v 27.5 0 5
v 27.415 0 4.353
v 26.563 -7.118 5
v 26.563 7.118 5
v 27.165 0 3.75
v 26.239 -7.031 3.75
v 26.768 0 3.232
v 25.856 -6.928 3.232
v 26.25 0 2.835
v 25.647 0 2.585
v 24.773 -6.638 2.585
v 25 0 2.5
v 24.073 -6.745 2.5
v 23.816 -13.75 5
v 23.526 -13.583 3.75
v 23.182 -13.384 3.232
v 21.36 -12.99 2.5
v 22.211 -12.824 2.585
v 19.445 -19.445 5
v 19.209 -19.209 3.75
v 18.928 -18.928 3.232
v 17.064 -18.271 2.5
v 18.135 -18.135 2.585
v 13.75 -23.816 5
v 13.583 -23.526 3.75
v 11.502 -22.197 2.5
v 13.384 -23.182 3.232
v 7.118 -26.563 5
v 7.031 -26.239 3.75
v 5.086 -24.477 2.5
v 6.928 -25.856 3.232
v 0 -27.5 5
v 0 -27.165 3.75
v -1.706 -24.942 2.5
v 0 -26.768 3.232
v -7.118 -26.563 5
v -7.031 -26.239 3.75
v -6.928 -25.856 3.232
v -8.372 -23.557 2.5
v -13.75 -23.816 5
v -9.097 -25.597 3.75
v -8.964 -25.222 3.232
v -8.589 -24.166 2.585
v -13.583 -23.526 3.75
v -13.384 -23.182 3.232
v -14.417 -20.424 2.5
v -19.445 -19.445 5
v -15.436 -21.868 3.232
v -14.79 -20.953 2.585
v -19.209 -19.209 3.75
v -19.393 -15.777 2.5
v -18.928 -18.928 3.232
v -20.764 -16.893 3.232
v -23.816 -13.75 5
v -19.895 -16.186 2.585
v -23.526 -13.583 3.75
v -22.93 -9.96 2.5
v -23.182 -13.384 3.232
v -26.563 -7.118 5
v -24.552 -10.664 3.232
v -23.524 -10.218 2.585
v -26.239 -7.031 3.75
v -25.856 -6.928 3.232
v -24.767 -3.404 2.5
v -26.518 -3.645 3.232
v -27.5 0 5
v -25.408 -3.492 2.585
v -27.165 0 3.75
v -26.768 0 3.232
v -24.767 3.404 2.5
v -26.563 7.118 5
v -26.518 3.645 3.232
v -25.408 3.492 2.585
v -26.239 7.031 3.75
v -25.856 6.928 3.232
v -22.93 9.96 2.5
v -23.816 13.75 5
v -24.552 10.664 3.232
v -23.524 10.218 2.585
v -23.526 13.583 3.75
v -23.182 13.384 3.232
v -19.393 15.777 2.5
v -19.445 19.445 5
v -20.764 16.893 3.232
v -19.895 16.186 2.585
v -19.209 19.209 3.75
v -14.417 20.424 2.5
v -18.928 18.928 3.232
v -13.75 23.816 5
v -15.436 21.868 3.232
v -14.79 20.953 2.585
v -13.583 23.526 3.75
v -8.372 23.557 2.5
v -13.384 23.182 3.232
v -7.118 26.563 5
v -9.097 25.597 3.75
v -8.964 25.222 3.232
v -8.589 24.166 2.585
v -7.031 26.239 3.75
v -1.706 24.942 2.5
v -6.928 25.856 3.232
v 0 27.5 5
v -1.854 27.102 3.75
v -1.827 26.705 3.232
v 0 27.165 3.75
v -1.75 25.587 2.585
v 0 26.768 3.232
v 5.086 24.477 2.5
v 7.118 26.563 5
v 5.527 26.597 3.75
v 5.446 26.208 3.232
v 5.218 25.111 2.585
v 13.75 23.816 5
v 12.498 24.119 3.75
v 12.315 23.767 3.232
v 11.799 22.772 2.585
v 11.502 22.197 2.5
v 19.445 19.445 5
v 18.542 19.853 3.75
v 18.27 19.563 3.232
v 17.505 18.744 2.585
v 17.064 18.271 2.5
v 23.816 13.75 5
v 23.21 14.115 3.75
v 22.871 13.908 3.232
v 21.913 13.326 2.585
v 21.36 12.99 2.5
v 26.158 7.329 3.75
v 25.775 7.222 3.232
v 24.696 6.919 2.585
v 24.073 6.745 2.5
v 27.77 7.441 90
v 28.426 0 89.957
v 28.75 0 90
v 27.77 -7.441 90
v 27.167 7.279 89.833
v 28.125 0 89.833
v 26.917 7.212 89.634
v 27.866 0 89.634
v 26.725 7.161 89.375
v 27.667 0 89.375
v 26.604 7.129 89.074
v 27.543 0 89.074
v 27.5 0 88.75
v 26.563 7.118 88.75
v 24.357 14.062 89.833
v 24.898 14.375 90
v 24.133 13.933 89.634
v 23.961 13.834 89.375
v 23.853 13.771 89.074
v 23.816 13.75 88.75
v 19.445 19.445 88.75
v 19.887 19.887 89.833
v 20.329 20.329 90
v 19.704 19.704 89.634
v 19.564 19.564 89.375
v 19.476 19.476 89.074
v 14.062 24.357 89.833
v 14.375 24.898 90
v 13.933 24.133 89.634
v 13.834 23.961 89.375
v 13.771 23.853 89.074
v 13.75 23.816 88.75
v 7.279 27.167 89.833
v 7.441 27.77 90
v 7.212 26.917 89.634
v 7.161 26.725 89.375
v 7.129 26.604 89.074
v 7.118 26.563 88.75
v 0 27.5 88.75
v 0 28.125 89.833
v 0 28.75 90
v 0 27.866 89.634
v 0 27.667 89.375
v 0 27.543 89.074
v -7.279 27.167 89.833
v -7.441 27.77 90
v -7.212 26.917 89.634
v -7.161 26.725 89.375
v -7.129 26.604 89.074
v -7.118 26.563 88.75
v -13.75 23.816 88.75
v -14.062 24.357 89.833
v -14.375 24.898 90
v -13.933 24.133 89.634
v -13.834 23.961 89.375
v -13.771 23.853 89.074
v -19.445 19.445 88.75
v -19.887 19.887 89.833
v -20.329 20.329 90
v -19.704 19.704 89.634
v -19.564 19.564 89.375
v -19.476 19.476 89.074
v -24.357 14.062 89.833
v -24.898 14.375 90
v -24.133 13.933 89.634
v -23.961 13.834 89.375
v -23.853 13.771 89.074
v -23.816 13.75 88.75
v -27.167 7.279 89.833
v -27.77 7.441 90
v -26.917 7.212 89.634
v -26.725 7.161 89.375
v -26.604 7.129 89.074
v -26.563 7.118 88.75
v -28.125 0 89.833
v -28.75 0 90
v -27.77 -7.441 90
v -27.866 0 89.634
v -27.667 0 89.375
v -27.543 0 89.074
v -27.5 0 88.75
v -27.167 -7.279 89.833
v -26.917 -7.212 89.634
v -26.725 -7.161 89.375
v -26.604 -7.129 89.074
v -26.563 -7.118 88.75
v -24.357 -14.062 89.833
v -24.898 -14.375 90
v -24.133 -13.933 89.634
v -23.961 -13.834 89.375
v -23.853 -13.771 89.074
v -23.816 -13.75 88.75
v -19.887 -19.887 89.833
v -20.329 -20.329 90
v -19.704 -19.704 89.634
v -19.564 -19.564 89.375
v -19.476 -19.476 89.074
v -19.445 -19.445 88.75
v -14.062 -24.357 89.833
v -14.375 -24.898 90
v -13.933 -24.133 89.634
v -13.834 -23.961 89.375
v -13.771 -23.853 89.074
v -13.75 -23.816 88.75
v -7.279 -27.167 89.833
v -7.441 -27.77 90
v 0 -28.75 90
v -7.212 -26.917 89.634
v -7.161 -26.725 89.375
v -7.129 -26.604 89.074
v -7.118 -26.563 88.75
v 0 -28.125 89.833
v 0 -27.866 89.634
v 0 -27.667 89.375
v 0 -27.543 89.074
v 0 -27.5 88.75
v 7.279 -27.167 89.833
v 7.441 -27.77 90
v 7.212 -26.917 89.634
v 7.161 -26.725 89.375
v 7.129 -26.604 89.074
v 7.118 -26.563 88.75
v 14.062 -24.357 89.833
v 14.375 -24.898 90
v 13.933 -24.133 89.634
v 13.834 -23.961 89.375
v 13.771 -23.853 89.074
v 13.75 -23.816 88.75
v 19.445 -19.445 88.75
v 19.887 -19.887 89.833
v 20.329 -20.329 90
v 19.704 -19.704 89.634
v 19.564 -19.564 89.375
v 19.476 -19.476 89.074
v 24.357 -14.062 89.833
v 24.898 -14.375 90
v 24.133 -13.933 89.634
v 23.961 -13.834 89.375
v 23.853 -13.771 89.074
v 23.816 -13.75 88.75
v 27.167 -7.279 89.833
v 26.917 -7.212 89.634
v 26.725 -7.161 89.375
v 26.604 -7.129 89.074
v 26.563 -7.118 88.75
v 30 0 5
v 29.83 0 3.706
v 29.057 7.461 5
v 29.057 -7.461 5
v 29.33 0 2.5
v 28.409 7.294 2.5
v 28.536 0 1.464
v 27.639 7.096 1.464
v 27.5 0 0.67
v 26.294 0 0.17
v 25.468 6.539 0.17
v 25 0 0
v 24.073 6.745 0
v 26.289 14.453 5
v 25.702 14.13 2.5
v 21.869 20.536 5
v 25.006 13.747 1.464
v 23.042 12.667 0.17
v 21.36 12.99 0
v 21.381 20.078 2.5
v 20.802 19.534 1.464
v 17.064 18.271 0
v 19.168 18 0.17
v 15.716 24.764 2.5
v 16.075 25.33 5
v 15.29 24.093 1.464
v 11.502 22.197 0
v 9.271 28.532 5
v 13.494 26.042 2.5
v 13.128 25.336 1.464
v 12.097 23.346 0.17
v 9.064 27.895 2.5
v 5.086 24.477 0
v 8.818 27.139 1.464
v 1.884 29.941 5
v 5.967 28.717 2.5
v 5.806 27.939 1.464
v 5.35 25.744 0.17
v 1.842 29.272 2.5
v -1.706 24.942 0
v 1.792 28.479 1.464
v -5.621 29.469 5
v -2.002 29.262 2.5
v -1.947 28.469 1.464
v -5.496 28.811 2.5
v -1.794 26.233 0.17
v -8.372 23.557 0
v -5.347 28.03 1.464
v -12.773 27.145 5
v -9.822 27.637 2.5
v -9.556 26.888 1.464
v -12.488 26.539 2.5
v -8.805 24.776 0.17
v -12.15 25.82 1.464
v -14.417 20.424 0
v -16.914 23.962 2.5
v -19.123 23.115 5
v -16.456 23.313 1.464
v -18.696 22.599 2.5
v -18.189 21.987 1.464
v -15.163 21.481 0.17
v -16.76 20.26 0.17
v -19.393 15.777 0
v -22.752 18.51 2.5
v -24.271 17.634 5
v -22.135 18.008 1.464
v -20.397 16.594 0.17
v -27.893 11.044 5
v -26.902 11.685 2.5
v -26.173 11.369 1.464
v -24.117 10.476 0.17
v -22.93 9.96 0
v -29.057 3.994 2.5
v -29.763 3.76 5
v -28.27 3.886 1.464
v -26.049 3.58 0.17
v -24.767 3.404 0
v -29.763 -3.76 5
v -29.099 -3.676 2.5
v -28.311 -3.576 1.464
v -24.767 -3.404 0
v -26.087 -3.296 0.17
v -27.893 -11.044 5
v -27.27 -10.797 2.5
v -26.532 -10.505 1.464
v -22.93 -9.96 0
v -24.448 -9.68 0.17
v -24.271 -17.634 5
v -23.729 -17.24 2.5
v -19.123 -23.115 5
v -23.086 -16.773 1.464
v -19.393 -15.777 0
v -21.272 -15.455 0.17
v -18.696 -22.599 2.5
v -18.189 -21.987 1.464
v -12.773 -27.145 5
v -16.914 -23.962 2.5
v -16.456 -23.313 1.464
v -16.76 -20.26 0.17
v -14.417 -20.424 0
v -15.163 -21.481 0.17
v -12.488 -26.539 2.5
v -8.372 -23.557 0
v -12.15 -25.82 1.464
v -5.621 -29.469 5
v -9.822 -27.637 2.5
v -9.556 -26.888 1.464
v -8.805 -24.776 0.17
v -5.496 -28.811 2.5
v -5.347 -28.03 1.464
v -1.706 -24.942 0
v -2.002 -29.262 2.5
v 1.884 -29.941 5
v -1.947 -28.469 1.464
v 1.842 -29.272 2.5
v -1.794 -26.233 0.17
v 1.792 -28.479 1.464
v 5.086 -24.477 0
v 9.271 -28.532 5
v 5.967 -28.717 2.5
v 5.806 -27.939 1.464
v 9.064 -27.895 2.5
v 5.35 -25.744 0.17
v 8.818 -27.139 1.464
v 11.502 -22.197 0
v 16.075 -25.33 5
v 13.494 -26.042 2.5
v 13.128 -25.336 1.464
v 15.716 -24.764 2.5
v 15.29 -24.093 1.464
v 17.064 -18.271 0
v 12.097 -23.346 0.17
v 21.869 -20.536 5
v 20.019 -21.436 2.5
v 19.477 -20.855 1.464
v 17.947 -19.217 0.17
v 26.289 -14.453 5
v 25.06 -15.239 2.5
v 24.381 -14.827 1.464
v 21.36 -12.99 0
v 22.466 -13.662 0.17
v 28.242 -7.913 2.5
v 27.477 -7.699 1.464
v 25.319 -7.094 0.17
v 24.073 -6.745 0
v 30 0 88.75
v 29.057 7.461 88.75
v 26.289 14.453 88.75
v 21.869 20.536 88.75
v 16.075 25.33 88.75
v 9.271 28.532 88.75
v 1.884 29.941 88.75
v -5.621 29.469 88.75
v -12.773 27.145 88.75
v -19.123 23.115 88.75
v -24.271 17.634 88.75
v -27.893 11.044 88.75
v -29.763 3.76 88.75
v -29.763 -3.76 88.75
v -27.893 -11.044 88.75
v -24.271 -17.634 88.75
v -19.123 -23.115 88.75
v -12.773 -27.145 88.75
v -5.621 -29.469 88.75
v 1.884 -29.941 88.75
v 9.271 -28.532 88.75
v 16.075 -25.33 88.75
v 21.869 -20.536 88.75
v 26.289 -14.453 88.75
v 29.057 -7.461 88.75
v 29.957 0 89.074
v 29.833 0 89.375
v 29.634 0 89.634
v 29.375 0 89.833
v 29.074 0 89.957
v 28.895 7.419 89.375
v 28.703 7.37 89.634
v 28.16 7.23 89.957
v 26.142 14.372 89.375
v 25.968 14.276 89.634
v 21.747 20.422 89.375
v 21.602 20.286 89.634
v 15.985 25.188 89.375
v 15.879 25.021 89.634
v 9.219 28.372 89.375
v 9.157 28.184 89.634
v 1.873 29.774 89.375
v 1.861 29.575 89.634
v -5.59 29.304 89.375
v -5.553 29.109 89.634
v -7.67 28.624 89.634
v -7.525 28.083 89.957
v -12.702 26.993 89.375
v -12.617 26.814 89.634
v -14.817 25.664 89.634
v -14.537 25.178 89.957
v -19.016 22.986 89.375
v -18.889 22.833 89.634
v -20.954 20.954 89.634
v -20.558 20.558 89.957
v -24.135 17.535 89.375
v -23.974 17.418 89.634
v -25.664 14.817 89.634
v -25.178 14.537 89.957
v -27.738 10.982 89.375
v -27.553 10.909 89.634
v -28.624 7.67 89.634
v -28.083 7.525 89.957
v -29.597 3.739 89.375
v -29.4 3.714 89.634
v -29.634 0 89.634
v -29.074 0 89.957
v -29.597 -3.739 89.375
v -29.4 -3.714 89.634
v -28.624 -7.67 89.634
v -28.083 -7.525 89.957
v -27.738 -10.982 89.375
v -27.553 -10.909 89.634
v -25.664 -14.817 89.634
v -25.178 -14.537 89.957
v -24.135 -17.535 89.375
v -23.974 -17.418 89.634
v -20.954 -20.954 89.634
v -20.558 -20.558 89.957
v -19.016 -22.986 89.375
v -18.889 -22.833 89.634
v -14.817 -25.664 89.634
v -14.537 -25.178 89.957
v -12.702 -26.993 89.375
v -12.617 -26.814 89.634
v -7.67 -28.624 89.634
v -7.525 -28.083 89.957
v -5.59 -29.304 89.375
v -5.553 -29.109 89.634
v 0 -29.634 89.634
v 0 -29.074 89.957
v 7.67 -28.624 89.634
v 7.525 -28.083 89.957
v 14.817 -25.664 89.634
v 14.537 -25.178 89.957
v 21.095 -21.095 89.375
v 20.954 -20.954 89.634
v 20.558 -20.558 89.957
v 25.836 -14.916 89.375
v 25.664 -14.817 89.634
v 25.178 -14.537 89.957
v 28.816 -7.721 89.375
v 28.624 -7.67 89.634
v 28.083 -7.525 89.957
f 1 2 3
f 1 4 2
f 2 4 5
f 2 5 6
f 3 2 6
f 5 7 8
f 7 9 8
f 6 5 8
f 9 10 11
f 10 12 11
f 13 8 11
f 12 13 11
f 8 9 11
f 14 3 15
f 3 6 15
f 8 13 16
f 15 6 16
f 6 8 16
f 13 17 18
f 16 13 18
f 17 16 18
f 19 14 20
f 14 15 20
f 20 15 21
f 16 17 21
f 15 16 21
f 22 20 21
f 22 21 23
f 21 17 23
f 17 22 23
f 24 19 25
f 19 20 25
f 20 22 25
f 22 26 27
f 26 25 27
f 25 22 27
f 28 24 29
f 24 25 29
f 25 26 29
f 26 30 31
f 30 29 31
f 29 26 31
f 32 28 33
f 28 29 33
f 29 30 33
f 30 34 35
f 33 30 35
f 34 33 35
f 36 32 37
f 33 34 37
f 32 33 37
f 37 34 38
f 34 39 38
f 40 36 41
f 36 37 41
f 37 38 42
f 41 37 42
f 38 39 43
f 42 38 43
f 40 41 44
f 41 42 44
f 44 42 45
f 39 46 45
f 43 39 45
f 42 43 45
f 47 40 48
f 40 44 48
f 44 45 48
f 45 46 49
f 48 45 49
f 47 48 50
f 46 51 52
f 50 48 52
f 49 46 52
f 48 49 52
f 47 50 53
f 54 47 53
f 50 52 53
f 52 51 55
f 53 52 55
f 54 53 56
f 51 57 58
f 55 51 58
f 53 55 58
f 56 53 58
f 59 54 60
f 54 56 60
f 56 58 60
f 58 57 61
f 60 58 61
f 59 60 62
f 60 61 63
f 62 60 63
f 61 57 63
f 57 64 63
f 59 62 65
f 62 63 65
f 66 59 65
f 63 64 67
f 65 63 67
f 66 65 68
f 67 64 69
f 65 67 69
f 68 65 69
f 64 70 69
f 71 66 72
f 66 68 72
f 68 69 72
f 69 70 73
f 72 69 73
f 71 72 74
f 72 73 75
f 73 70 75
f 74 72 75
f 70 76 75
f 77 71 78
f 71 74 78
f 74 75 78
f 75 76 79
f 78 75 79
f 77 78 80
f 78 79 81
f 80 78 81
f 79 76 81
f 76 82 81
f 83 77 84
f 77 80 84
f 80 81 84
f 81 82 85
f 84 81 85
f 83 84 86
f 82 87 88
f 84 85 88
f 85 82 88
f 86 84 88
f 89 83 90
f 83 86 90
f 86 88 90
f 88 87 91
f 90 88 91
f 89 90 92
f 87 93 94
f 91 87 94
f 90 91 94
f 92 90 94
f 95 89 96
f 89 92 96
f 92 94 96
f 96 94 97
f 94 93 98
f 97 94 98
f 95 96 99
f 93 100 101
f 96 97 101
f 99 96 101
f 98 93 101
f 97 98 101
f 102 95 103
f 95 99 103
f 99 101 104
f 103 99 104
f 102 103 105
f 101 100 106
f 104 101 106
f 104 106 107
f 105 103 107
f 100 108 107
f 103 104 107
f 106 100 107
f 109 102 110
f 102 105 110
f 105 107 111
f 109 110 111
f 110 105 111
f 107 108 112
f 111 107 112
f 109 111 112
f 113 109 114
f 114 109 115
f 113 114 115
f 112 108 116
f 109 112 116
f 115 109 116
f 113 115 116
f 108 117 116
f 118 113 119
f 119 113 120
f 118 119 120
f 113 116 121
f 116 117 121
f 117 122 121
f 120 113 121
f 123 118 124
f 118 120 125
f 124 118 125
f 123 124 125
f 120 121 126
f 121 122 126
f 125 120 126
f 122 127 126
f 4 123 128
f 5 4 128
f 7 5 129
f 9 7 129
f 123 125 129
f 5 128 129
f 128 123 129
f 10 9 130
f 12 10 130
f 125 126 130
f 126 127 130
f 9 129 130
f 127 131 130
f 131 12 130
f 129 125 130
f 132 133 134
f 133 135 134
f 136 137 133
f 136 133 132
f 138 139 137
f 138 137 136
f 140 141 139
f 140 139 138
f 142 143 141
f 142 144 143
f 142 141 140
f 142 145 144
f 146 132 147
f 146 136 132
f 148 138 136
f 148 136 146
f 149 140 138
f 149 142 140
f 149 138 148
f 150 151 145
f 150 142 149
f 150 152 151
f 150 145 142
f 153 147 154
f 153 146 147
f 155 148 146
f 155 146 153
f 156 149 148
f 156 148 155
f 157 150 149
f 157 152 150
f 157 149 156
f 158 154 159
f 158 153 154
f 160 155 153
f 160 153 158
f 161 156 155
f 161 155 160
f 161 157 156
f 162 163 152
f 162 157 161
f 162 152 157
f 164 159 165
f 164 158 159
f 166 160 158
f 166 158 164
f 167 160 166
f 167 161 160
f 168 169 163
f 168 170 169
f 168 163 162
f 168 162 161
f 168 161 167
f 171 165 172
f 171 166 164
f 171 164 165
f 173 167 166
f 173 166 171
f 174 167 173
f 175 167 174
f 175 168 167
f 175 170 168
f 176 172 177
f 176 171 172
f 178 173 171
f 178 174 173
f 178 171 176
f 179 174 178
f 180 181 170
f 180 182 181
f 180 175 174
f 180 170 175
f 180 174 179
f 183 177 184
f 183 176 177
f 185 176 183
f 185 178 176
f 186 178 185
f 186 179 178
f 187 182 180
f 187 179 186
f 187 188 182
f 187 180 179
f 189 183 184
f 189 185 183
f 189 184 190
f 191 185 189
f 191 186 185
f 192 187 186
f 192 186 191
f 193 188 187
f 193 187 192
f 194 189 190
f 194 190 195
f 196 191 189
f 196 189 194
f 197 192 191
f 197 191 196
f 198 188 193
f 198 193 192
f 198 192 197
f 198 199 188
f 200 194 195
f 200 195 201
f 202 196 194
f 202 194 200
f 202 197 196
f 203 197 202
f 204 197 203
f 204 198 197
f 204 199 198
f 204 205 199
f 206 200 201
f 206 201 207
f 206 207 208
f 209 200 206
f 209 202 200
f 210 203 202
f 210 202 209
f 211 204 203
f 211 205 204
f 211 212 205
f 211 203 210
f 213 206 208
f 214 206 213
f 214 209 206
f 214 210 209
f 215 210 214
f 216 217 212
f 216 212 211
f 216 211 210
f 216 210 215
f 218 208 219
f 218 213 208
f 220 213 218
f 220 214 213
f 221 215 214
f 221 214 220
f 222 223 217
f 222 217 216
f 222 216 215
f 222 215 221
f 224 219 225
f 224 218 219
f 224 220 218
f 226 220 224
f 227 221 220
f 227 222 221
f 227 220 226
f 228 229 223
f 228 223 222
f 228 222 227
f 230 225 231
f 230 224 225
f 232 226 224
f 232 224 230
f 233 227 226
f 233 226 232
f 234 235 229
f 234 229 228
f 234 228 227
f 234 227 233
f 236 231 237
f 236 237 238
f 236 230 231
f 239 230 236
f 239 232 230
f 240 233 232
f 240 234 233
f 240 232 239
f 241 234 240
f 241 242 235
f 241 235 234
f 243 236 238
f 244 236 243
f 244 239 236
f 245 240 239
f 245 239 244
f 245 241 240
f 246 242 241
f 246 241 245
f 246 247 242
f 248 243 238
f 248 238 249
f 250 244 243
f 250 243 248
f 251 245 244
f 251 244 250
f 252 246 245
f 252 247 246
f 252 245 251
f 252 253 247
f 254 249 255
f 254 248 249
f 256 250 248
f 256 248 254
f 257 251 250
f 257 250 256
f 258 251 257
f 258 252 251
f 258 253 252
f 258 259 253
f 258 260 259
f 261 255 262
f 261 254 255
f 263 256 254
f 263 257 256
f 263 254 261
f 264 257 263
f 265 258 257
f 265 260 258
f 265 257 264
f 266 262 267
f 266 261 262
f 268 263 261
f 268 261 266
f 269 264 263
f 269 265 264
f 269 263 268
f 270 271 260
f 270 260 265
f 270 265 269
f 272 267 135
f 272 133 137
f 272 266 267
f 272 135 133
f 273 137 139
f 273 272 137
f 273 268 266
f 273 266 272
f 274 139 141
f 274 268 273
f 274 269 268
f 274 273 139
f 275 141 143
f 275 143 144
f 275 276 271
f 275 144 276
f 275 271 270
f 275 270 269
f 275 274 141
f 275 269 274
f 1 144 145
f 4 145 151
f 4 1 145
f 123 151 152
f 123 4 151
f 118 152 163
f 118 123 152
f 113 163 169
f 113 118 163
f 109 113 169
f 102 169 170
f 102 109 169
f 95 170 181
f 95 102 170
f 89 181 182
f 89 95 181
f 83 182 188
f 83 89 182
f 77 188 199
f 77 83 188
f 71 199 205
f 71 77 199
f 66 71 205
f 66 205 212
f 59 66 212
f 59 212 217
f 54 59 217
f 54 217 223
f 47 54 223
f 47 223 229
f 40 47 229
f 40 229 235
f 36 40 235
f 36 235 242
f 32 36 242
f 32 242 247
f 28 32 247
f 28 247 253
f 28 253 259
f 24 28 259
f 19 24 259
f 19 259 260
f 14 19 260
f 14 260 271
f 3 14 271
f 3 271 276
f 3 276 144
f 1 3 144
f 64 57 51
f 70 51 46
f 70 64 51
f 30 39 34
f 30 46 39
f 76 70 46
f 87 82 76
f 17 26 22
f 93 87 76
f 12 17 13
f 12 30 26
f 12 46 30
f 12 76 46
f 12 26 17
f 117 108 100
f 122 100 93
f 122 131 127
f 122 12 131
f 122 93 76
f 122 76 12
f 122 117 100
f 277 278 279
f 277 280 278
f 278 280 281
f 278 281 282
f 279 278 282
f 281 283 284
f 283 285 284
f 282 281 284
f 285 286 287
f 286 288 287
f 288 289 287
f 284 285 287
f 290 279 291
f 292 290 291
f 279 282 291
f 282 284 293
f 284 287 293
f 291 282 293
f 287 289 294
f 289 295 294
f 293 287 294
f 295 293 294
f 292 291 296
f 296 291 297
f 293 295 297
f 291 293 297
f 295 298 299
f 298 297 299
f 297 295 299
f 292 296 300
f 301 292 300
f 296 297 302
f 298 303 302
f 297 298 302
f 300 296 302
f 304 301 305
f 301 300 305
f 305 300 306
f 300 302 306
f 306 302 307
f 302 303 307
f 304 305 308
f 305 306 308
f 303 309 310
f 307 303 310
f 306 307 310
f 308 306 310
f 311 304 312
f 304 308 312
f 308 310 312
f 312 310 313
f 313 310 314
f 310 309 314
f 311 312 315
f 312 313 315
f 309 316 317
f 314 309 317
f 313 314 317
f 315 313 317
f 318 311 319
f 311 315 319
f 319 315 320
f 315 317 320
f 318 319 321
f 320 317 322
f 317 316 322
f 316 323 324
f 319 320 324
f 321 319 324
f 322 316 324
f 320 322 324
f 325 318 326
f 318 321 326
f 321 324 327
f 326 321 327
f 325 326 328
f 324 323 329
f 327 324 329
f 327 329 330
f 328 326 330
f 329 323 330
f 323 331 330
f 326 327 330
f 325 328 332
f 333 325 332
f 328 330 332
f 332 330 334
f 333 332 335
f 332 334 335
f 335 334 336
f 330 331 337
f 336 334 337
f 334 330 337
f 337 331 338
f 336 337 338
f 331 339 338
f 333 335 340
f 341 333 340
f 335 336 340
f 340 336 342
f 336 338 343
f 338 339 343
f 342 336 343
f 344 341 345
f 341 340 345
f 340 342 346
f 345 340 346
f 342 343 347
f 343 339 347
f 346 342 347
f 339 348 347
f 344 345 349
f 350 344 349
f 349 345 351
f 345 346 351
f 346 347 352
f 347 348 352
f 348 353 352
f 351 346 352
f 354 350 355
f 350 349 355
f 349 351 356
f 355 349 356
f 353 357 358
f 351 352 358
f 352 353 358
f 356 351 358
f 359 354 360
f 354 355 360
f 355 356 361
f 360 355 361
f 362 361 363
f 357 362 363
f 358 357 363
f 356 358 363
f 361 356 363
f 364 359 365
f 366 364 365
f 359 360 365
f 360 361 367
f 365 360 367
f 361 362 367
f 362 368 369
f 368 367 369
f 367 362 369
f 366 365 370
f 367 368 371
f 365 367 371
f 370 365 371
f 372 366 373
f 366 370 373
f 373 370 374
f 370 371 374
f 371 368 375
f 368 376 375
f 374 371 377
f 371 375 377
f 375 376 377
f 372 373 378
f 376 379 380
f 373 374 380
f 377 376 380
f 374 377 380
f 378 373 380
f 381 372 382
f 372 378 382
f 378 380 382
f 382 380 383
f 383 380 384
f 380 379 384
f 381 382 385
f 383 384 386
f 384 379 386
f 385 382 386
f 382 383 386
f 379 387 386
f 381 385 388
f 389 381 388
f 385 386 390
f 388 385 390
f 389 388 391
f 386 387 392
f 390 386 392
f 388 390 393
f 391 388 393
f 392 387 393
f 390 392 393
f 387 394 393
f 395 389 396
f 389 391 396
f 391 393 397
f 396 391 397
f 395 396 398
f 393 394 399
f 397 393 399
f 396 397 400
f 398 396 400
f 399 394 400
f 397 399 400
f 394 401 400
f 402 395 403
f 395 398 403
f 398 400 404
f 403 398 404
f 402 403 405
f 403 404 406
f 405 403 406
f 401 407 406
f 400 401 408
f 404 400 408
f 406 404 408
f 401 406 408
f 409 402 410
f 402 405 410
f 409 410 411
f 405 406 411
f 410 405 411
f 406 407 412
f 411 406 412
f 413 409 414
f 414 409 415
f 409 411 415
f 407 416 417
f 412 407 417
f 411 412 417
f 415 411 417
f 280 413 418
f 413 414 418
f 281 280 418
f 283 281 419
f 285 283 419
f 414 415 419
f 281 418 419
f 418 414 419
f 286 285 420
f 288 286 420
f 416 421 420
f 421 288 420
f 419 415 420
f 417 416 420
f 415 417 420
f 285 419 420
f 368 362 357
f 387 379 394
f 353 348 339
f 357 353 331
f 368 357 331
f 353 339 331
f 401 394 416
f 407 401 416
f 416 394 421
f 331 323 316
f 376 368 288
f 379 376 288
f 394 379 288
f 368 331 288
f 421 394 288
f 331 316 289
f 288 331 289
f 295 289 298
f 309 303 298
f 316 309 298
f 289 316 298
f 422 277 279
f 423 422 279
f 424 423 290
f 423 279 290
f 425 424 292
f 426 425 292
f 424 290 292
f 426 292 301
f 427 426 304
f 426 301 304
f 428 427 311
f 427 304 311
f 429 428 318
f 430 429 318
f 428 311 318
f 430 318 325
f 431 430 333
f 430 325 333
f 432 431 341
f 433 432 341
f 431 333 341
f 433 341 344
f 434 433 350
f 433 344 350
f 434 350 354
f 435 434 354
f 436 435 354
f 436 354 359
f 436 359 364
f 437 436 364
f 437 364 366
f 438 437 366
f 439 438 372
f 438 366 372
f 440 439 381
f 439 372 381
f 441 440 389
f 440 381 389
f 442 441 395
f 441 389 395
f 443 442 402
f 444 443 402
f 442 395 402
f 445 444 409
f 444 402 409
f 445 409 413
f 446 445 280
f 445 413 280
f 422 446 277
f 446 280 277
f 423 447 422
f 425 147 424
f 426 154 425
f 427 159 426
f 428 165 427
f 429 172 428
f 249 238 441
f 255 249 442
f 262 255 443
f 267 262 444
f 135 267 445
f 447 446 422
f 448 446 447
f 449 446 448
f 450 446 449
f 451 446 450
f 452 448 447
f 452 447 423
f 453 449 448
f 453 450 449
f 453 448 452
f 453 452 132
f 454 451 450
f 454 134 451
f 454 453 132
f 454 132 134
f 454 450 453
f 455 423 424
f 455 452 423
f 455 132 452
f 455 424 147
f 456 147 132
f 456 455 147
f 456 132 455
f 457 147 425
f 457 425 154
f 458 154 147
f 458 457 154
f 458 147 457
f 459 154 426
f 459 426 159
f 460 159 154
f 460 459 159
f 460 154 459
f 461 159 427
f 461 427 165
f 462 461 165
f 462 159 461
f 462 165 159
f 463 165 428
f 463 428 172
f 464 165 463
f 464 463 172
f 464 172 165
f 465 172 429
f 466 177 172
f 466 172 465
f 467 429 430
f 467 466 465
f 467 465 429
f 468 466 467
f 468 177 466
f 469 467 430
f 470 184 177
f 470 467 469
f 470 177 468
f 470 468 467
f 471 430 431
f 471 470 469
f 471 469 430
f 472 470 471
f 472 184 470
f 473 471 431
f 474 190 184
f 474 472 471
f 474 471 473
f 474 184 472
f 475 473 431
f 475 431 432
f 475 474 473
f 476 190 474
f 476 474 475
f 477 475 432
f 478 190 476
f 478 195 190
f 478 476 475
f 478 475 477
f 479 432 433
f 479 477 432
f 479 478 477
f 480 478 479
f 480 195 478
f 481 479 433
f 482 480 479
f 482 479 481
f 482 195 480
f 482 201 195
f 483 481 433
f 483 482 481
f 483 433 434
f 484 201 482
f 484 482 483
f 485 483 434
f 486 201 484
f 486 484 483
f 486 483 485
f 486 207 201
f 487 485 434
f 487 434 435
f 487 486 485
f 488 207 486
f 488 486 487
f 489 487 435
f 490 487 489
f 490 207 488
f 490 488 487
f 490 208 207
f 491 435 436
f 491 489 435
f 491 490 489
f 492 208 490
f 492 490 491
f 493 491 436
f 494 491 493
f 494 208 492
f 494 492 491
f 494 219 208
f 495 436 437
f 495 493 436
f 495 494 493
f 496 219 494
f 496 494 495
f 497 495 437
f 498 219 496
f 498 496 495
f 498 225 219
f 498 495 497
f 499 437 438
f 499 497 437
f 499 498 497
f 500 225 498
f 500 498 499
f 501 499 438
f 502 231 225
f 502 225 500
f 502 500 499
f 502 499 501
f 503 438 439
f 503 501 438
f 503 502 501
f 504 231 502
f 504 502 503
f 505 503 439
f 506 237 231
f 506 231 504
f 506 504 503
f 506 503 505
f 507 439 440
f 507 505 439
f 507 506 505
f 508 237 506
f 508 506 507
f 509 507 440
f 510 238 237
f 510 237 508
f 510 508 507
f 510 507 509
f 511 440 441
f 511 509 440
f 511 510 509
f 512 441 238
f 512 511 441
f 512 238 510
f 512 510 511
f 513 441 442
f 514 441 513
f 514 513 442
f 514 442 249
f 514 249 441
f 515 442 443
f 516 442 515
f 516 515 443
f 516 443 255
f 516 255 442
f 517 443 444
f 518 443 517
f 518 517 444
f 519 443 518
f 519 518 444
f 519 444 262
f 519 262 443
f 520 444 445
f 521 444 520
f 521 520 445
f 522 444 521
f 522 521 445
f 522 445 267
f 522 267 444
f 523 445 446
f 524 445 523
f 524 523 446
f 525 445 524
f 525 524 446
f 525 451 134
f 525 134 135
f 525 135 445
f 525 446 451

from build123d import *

# Parameters (mm, degrees)
F0_R     = 30
F1_DEPTH = 90
F2_T     = -2.5
F3_R     = 2.5
F4_R     = 5
F5_R     = 1.24999


# Not quite as in the source:
# - a fillet or chamfer is up to 0.001 mm smaller than in the source, because OpenCascade refuses the exact size


with BuildPart() as f1:
    # F0 (on Top) → F1 (new body)
    with BuildSketch(Plane.XY):
        Circle(F0_R)
    extrude(amount=F1_DEPTH)

    # F2
    f2_openings = [f1.faces().sort_by_distance(p)[0] for p in [
        (0, 0, 90),
    ]]
    offset(amount=F2_T, openings=f2_openings)

    # F3
    f3_edges = [f1.edges().sort_by_distance(p)[0] for p in [
        (-27.5, 0, 2.5),
    ]]
    fillet(f3_edges, radius=F3_R)

    # F4
    f4_edges = [f1.edges().sort_by_distance(p)[0] for p in [
        (-30, 0, 0),
    ]]
    fillet(f4_edges, radius=F4_R)

    # F5 (radius 1.25 in the source; OpenCascade refuses exactly that, so slightly less here)
    f5_edges = [f1.edges().sort_by_distance(p)[0] for p in [
        (-30, 0, 90),
        (-27.5, 0, 90),
    ]]
    fillet(f5_edges, radius=F5_R)


solid = f1.part
